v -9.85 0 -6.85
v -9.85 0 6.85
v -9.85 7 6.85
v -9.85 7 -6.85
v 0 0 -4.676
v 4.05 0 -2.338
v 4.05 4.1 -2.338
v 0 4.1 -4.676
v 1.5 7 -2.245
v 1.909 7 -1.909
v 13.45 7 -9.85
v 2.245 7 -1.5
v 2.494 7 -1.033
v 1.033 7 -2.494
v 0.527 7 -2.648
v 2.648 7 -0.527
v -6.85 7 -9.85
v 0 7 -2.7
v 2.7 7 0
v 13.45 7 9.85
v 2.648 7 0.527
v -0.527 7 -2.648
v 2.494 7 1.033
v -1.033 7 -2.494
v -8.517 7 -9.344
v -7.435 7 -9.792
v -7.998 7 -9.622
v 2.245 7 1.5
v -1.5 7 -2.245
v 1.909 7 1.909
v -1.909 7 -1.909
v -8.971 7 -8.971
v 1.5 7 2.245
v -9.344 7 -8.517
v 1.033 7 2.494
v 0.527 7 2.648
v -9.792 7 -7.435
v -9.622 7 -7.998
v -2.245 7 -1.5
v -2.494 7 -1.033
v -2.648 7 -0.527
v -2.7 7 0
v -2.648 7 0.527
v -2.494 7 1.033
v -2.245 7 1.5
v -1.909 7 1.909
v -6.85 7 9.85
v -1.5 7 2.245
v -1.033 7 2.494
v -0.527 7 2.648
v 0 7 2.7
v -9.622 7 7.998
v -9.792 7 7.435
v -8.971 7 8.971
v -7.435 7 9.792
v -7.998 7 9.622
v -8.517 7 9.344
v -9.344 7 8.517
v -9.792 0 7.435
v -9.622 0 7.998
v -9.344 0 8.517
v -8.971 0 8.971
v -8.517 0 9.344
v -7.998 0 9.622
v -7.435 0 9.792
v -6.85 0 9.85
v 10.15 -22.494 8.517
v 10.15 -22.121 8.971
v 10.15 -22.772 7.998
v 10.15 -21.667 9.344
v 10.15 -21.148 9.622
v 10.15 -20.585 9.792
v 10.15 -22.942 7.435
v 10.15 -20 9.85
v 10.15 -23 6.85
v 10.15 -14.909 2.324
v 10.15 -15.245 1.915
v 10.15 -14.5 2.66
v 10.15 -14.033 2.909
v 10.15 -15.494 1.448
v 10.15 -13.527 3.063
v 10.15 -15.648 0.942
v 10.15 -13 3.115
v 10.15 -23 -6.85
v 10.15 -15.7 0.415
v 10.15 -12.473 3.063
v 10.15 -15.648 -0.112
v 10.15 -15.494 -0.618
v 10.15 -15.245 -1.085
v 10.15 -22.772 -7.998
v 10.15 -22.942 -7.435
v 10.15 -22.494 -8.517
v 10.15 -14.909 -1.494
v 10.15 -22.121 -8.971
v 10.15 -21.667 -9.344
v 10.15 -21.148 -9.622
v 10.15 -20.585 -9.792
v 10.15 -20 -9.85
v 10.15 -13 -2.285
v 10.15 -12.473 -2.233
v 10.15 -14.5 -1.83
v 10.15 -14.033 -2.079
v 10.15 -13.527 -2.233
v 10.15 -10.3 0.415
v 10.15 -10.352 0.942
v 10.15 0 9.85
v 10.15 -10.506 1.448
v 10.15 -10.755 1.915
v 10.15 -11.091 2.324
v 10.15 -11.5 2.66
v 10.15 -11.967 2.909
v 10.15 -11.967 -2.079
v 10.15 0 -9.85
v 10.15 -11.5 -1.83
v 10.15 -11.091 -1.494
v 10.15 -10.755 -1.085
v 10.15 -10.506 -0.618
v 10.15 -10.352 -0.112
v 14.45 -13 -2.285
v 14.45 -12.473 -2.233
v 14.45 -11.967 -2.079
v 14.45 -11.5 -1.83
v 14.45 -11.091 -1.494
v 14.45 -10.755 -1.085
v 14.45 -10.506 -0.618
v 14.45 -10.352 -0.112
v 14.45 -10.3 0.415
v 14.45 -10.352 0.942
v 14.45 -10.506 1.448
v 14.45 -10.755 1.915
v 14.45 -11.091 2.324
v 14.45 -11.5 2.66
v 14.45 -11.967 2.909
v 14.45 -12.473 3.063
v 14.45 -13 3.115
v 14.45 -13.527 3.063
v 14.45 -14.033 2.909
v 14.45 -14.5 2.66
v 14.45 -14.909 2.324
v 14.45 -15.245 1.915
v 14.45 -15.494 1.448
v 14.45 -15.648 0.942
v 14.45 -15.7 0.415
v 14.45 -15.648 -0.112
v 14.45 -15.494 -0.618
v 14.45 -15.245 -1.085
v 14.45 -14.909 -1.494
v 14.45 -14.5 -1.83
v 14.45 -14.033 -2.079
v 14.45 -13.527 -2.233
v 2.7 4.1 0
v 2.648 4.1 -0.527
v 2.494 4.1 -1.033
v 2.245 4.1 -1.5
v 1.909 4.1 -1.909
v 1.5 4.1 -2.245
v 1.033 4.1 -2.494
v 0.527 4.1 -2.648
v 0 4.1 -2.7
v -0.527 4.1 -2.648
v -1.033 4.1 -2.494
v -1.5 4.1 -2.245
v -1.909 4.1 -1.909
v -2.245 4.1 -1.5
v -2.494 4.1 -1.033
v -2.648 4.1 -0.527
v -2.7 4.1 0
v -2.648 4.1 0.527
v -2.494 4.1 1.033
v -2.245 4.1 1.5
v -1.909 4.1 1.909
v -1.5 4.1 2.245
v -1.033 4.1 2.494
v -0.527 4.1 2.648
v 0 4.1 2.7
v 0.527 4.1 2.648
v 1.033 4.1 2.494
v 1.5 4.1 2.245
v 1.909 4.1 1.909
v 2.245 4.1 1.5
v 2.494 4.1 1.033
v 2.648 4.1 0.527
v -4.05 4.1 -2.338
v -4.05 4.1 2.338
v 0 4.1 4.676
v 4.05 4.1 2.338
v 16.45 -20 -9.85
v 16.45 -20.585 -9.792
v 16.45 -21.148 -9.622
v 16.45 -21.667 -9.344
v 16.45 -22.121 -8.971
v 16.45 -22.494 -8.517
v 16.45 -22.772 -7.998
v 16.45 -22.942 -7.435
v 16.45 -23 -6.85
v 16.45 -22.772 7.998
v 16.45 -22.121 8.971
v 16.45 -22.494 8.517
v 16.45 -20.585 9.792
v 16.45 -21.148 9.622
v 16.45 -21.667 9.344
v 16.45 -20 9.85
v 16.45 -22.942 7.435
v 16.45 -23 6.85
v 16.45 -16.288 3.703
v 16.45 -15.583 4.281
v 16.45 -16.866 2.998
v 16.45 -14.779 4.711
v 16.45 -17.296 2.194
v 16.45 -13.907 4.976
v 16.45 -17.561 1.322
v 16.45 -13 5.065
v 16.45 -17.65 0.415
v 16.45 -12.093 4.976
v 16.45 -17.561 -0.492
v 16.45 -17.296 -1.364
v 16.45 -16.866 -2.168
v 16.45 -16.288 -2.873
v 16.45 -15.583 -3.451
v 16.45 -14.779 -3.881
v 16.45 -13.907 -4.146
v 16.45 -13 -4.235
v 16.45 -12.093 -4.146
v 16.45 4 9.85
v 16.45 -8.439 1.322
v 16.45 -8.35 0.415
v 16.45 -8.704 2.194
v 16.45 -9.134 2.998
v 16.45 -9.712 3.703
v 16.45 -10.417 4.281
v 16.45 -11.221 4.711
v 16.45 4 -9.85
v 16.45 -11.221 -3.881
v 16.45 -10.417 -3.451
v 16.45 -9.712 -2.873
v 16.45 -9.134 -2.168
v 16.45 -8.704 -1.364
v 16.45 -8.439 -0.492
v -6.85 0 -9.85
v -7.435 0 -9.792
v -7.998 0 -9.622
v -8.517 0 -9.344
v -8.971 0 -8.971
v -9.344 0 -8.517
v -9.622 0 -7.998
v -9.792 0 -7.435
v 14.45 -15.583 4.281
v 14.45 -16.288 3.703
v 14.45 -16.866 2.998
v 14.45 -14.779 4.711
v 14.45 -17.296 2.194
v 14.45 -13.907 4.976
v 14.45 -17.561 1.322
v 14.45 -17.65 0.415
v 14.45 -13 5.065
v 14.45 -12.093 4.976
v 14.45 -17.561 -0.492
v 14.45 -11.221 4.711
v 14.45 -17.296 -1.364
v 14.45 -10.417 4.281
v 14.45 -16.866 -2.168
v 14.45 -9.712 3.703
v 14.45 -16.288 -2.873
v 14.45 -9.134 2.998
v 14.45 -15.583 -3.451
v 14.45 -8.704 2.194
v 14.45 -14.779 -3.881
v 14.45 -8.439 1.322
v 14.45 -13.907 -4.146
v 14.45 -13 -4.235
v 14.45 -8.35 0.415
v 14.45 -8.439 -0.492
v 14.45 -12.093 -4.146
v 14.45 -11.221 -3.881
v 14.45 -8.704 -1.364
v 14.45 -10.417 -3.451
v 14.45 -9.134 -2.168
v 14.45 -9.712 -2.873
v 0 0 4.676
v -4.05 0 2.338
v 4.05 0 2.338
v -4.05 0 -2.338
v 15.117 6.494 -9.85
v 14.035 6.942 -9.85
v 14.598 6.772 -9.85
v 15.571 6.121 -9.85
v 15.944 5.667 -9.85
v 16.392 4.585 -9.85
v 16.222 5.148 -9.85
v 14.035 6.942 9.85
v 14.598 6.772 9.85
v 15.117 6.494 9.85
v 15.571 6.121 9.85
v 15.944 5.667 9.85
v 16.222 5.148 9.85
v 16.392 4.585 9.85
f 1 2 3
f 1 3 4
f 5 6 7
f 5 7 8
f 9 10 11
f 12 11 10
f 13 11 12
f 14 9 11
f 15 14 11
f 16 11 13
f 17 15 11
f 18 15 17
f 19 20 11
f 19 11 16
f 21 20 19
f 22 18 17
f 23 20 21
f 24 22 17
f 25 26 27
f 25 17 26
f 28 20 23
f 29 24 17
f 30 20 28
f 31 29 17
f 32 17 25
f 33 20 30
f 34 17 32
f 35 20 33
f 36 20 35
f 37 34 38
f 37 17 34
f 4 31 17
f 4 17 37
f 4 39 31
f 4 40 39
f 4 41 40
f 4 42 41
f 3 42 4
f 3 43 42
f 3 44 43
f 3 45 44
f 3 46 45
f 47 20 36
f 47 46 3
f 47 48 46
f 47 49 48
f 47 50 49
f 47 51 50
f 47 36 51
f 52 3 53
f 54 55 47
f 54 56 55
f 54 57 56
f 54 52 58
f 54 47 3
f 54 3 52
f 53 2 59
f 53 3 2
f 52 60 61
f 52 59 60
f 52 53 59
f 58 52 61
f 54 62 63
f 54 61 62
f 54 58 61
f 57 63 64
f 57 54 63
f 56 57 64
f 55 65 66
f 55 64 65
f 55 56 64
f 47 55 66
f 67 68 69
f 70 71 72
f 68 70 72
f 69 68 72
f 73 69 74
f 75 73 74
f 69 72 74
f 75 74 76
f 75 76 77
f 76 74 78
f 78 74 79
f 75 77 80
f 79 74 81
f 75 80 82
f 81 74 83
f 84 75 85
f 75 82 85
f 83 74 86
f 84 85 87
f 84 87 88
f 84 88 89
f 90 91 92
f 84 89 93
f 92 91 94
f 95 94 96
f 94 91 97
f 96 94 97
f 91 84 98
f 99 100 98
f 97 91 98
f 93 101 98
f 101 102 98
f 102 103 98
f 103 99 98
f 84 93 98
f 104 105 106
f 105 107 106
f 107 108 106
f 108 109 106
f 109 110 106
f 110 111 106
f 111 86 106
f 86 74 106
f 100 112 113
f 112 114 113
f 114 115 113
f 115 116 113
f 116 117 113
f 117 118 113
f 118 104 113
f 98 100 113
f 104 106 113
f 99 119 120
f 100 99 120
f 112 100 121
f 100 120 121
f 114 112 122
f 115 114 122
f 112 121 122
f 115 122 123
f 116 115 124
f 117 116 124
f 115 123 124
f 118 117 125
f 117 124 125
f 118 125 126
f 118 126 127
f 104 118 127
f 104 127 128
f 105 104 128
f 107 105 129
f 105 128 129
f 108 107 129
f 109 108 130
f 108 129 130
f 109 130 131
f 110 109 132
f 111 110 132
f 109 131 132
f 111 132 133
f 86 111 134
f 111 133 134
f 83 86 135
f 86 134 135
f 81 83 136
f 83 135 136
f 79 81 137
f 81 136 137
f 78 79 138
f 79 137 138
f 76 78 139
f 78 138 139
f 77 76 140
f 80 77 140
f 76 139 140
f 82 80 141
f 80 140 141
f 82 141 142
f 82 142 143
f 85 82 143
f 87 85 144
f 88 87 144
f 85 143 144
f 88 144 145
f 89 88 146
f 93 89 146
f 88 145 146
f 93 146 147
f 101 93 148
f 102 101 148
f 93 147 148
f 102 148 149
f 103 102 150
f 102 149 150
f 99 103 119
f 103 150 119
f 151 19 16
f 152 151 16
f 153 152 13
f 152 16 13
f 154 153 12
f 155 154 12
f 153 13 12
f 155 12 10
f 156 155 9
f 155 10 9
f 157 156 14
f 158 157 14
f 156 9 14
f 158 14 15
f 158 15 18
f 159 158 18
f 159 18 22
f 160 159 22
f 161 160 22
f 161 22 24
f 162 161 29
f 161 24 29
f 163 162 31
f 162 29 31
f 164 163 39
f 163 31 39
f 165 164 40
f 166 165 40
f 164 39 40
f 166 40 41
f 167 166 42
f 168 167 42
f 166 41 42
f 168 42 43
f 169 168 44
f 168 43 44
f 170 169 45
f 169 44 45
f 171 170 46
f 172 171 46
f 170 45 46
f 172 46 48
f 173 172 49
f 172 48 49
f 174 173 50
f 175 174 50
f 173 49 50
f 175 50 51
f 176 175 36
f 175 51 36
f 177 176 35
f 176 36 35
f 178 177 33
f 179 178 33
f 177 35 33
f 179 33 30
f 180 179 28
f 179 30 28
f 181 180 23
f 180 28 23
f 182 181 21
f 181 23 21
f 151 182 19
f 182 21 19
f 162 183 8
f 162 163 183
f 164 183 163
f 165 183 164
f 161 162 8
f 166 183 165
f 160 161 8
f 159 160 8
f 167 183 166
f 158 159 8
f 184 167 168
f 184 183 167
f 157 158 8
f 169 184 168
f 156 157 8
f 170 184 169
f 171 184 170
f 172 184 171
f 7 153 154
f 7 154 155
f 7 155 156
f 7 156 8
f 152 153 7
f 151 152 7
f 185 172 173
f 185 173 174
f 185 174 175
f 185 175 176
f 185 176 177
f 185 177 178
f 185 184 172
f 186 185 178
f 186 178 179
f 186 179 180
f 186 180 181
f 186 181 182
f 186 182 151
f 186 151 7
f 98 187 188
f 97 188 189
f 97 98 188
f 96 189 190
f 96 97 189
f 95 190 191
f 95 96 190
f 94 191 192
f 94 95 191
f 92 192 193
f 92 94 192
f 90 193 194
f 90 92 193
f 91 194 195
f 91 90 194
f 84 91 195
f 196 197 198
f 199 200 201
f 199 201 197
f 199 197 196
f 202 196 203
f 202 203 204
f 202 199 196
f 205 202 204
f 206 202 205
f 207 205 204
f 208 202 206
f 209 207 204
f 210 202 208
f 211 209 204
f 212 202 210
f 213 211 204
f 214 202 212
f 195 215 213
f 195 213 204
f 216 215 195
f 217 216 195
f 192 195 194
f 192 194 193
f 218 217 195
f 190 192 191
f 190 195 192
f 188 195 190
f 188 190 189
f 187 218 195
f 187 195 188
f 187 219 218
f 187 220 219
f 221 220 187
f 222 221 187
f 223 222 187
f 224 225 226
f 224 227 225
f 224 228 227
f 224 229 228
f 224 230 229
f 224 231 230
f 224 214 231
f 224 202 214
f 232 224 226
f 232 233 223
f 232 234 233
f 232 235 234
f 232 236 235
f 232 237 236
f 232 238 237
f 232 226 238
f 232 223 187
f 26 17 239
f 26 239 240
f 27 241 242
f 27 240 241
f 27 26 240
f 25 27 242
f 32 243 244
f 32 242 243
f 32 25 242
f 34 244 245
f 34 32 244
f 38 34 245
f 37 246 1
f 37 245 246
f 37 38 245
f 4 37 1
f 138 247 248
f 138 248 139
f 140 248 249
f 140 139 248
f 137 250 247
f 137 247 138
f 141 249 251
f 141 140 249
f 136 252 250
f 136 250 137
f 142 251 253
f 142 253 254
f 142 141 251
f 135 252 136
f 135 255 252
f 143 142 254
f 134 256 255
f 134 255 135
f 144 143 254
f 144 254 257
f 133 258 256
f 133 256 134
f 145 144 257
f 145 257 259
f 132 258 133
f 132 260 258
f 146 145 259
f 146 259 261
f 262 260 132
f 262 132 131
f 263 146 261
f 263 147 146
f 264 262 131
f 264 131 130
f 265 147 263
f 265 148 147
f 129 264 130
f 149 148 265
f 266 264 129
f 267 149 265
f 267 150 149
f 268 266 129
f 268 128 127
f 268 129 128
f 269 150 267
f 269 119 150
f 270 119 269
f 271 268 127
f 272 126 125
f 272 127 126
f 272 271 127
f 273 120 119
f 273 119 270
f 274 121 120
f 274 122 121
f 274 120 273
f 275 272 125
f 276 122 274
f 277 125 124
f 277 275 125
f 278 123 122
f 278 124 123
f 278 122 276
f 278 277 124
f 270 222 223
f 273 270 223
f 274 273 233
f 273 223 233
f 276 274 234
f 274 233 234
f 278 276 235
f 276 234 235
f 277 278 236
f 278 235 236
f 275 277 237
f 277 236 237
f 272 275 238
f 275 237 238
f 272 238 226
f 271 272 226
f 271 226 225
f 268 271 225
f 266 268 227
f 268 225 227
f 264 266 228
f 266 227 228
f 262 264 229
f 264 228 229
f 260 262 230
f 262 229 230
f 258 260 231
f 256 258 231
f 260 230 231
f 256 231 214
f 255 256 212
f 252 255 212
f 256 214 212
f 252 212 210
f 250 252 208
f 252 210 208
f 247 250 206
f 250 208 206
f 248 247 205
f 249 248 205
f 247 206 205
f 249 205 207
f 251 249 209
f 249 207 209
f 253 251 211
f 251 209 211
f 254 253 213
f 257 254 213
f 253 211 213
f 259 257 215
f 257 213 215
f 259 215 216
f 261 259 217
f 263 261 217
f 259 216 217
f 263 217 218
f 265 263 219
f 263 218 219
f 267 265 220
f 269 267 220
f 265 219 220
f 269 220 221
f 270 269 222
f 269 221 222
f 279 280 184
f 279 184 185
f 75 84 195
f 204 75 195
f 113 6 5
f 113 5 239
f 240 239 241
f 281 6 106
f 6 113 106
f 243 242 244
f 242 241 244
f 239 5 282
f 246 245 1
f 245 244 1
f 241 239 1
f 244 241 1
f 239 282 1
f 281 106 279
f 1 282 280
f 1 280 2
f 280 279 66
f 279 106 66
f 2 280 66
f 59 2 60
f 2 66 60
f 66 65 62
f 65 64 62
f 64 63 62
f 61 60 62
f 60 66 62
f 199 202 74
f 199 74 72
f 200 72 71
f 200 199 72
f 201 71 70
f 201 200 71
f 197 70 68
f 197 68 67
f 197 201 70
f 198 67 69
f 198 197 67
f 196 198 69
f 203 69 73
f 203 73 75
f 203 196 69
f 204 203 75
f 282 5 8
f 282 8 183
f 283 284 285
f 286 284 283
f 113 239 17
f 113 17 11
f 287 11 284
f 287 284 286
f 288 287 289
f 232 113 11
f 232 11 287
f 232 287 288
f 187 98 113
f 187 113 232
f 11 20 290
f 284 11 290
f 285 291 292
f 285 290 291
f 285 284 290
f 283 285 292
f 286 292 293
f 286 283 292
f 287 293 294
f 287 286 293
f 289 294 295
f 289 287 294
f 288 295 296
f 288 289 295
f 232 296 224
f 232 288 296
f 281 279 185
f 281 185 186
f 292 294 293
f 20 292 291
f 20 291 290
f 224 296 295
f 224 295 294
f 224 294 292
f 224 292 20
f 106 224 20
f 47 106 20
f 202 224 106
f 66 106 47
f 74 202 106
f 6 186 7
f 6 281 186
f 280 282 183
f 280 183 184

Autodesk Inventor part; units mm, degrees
ref_plane "YZ Plane" through (0, 0, 0) normal (1, 0, 0) x (0, 1, 0)
ref_plane "XZ Plane" through (0, 0, 0) normal (0, 1, 0) x (-1, 0, 0)
ref_plane "XY Plane" through (0, 0, 0) normal (0, 0, 1) x (1, 0, 0)
sketch "Boceto1" plane through (0, 0, 0) normal (0, 1, 0) x (-1, 0, 0)
  line L0 (-9.85, 9.85) -> (9.85, 9.85)
  line L1 (9.85, 9.85) -> (9.85, -9.85)
  line L2 (9.85, -9.85) -> (-9.85, -9.85)
  line L3 (-9.85, -9.85) -> (-9.85, 9.85)
  line L4 (-9.85, 9.85) -> (9.85, -9.85) construction
  line L5 (9.85, 9.85) -> (-9.85, -9.85) construction
  point P0 (0, 0)
  dimension "d0" = 19.7
  dimension "d1" = 19.7
extrude "Extrusión1" add sketch "Boceto1" along normal blind 7
sketch "Boceto2" plane through (0, 7, 0) normal (0, 1, 0) x (1, 0, 0)
  line L0 (-9.85, -9.85) -> (9.85, -9.85) projected
  line L1 (9.85, -9.85) -> (16.45, -9.85)
  line L2 (16.45, -9.85) -> (16.45, 9.85)
  line L3 (16.45, 9.85) -> (9.85, 9.85)
  line L4 (9.85, 9.85) -> (9.85, -9.85)
  line L5 (9.85, 9.85) -> (-9.85, 9.85) projected
  point P0 (0, 0)
  dimension "d4" = 6.6
extrude "Extrusión2" add sketch "Boceto2" against normal blind 30
sketch "Boceto3" plane through (16.45, 7, 9.85) normal (1, 0, 0) x (0, 0, -1)
  circle A0 centre (9.435, -20) radius 2.7
  line L0 (19.7, -30) -> (0, -30) projected
  point P0 (9.85, -7)
  dimension "d7" = 5.4
  dimension "d8" = 10
extrude "Extrusión3" cut sketch "Boceto3" against normal blind 20
sketch "Boceto4" plane through (16.45, 7, 9.85) normal (1, 0, 0) x (0, 0, -1)
  circle A0 centre (9.435, -20) radius 2.7 projected
  circle A1 centre (9.435, -20) radius 4.65
  point P0 (9.85, -7)
  dimension "d11" = 9.3
extrude "Extrusión4" cut sketch "Boceto4" against normal blind 2 contours A0 | A1
sketch "Boceto5" plane through (0, 7, 0) normal (0, 1, 0) x (1, 0, 0)
  circle A0 centre (0, 0) radius 2.7
  dimension "d14" = 5.4
extrude "Extrusión5" cut sketch "Boceto5" against normal through all
sketch "Boceto6" plane through (0, 0, 0) normal (0, -1, 0) x (1, 0, 0)
  circle A0 centre (0, 0) radius 4.05
  line L0 (0, 4.6765) -> (4.05, 2.3383)
  line L1 (4.05, 2.3383) -> (4.05, -2.3383)
  line L2 (4.05, -2.3383) -> (0, -4.6765)
  line L3 (0, -4.6765) -> (-4.05, -2.3383)
  line L4 (-4.05, -2.3383) -> (-4.05, 2.3383)
  line L5 (-4.05, 2.3383) -> (0, 4.6765)
  dimension "d17" = 8.1
extrude "Extrusión6" cut sketch "Boceto6" against normal blind 4.1
fillet "Empalme1" radius 3 3 edges at (16.45, 7, 0) (13.15, -23, 9.85) (13.15, -23, -9.85)
sketch "Boceto8" plane through (0, 0, 0) normal (0, -1, 0) x (1, 0, 0)
  line L0 (10.15, -10.15) -> (-10.15, -10.15)
  line L1 (-10.15, -10.15) -> (-10.15, 10.15)
  line L2 (-10.15, 10.15) -> (10.15, 10.15)
  line L3 (10.15, 10.15) -> (10.15, -10.15)
  line L4 (10.15, -10.15) -> (-10.15, 10.15) construction
  line L5 (-10.15, -10.15) -> (10.15, 10.15) construction
  point P0 (0, 0)
  dimension "d21" = 20.3
  dimension "d22" = 20.3
extrude "Extrusión7" cut sketch "Boceto8" along normal through all
fillet "Empalme2" radius 3 2 edges at (-9.85, 3.5, 9.85) (-9.85, 3.5, -9.85)
properties part number "soportetuerca"
